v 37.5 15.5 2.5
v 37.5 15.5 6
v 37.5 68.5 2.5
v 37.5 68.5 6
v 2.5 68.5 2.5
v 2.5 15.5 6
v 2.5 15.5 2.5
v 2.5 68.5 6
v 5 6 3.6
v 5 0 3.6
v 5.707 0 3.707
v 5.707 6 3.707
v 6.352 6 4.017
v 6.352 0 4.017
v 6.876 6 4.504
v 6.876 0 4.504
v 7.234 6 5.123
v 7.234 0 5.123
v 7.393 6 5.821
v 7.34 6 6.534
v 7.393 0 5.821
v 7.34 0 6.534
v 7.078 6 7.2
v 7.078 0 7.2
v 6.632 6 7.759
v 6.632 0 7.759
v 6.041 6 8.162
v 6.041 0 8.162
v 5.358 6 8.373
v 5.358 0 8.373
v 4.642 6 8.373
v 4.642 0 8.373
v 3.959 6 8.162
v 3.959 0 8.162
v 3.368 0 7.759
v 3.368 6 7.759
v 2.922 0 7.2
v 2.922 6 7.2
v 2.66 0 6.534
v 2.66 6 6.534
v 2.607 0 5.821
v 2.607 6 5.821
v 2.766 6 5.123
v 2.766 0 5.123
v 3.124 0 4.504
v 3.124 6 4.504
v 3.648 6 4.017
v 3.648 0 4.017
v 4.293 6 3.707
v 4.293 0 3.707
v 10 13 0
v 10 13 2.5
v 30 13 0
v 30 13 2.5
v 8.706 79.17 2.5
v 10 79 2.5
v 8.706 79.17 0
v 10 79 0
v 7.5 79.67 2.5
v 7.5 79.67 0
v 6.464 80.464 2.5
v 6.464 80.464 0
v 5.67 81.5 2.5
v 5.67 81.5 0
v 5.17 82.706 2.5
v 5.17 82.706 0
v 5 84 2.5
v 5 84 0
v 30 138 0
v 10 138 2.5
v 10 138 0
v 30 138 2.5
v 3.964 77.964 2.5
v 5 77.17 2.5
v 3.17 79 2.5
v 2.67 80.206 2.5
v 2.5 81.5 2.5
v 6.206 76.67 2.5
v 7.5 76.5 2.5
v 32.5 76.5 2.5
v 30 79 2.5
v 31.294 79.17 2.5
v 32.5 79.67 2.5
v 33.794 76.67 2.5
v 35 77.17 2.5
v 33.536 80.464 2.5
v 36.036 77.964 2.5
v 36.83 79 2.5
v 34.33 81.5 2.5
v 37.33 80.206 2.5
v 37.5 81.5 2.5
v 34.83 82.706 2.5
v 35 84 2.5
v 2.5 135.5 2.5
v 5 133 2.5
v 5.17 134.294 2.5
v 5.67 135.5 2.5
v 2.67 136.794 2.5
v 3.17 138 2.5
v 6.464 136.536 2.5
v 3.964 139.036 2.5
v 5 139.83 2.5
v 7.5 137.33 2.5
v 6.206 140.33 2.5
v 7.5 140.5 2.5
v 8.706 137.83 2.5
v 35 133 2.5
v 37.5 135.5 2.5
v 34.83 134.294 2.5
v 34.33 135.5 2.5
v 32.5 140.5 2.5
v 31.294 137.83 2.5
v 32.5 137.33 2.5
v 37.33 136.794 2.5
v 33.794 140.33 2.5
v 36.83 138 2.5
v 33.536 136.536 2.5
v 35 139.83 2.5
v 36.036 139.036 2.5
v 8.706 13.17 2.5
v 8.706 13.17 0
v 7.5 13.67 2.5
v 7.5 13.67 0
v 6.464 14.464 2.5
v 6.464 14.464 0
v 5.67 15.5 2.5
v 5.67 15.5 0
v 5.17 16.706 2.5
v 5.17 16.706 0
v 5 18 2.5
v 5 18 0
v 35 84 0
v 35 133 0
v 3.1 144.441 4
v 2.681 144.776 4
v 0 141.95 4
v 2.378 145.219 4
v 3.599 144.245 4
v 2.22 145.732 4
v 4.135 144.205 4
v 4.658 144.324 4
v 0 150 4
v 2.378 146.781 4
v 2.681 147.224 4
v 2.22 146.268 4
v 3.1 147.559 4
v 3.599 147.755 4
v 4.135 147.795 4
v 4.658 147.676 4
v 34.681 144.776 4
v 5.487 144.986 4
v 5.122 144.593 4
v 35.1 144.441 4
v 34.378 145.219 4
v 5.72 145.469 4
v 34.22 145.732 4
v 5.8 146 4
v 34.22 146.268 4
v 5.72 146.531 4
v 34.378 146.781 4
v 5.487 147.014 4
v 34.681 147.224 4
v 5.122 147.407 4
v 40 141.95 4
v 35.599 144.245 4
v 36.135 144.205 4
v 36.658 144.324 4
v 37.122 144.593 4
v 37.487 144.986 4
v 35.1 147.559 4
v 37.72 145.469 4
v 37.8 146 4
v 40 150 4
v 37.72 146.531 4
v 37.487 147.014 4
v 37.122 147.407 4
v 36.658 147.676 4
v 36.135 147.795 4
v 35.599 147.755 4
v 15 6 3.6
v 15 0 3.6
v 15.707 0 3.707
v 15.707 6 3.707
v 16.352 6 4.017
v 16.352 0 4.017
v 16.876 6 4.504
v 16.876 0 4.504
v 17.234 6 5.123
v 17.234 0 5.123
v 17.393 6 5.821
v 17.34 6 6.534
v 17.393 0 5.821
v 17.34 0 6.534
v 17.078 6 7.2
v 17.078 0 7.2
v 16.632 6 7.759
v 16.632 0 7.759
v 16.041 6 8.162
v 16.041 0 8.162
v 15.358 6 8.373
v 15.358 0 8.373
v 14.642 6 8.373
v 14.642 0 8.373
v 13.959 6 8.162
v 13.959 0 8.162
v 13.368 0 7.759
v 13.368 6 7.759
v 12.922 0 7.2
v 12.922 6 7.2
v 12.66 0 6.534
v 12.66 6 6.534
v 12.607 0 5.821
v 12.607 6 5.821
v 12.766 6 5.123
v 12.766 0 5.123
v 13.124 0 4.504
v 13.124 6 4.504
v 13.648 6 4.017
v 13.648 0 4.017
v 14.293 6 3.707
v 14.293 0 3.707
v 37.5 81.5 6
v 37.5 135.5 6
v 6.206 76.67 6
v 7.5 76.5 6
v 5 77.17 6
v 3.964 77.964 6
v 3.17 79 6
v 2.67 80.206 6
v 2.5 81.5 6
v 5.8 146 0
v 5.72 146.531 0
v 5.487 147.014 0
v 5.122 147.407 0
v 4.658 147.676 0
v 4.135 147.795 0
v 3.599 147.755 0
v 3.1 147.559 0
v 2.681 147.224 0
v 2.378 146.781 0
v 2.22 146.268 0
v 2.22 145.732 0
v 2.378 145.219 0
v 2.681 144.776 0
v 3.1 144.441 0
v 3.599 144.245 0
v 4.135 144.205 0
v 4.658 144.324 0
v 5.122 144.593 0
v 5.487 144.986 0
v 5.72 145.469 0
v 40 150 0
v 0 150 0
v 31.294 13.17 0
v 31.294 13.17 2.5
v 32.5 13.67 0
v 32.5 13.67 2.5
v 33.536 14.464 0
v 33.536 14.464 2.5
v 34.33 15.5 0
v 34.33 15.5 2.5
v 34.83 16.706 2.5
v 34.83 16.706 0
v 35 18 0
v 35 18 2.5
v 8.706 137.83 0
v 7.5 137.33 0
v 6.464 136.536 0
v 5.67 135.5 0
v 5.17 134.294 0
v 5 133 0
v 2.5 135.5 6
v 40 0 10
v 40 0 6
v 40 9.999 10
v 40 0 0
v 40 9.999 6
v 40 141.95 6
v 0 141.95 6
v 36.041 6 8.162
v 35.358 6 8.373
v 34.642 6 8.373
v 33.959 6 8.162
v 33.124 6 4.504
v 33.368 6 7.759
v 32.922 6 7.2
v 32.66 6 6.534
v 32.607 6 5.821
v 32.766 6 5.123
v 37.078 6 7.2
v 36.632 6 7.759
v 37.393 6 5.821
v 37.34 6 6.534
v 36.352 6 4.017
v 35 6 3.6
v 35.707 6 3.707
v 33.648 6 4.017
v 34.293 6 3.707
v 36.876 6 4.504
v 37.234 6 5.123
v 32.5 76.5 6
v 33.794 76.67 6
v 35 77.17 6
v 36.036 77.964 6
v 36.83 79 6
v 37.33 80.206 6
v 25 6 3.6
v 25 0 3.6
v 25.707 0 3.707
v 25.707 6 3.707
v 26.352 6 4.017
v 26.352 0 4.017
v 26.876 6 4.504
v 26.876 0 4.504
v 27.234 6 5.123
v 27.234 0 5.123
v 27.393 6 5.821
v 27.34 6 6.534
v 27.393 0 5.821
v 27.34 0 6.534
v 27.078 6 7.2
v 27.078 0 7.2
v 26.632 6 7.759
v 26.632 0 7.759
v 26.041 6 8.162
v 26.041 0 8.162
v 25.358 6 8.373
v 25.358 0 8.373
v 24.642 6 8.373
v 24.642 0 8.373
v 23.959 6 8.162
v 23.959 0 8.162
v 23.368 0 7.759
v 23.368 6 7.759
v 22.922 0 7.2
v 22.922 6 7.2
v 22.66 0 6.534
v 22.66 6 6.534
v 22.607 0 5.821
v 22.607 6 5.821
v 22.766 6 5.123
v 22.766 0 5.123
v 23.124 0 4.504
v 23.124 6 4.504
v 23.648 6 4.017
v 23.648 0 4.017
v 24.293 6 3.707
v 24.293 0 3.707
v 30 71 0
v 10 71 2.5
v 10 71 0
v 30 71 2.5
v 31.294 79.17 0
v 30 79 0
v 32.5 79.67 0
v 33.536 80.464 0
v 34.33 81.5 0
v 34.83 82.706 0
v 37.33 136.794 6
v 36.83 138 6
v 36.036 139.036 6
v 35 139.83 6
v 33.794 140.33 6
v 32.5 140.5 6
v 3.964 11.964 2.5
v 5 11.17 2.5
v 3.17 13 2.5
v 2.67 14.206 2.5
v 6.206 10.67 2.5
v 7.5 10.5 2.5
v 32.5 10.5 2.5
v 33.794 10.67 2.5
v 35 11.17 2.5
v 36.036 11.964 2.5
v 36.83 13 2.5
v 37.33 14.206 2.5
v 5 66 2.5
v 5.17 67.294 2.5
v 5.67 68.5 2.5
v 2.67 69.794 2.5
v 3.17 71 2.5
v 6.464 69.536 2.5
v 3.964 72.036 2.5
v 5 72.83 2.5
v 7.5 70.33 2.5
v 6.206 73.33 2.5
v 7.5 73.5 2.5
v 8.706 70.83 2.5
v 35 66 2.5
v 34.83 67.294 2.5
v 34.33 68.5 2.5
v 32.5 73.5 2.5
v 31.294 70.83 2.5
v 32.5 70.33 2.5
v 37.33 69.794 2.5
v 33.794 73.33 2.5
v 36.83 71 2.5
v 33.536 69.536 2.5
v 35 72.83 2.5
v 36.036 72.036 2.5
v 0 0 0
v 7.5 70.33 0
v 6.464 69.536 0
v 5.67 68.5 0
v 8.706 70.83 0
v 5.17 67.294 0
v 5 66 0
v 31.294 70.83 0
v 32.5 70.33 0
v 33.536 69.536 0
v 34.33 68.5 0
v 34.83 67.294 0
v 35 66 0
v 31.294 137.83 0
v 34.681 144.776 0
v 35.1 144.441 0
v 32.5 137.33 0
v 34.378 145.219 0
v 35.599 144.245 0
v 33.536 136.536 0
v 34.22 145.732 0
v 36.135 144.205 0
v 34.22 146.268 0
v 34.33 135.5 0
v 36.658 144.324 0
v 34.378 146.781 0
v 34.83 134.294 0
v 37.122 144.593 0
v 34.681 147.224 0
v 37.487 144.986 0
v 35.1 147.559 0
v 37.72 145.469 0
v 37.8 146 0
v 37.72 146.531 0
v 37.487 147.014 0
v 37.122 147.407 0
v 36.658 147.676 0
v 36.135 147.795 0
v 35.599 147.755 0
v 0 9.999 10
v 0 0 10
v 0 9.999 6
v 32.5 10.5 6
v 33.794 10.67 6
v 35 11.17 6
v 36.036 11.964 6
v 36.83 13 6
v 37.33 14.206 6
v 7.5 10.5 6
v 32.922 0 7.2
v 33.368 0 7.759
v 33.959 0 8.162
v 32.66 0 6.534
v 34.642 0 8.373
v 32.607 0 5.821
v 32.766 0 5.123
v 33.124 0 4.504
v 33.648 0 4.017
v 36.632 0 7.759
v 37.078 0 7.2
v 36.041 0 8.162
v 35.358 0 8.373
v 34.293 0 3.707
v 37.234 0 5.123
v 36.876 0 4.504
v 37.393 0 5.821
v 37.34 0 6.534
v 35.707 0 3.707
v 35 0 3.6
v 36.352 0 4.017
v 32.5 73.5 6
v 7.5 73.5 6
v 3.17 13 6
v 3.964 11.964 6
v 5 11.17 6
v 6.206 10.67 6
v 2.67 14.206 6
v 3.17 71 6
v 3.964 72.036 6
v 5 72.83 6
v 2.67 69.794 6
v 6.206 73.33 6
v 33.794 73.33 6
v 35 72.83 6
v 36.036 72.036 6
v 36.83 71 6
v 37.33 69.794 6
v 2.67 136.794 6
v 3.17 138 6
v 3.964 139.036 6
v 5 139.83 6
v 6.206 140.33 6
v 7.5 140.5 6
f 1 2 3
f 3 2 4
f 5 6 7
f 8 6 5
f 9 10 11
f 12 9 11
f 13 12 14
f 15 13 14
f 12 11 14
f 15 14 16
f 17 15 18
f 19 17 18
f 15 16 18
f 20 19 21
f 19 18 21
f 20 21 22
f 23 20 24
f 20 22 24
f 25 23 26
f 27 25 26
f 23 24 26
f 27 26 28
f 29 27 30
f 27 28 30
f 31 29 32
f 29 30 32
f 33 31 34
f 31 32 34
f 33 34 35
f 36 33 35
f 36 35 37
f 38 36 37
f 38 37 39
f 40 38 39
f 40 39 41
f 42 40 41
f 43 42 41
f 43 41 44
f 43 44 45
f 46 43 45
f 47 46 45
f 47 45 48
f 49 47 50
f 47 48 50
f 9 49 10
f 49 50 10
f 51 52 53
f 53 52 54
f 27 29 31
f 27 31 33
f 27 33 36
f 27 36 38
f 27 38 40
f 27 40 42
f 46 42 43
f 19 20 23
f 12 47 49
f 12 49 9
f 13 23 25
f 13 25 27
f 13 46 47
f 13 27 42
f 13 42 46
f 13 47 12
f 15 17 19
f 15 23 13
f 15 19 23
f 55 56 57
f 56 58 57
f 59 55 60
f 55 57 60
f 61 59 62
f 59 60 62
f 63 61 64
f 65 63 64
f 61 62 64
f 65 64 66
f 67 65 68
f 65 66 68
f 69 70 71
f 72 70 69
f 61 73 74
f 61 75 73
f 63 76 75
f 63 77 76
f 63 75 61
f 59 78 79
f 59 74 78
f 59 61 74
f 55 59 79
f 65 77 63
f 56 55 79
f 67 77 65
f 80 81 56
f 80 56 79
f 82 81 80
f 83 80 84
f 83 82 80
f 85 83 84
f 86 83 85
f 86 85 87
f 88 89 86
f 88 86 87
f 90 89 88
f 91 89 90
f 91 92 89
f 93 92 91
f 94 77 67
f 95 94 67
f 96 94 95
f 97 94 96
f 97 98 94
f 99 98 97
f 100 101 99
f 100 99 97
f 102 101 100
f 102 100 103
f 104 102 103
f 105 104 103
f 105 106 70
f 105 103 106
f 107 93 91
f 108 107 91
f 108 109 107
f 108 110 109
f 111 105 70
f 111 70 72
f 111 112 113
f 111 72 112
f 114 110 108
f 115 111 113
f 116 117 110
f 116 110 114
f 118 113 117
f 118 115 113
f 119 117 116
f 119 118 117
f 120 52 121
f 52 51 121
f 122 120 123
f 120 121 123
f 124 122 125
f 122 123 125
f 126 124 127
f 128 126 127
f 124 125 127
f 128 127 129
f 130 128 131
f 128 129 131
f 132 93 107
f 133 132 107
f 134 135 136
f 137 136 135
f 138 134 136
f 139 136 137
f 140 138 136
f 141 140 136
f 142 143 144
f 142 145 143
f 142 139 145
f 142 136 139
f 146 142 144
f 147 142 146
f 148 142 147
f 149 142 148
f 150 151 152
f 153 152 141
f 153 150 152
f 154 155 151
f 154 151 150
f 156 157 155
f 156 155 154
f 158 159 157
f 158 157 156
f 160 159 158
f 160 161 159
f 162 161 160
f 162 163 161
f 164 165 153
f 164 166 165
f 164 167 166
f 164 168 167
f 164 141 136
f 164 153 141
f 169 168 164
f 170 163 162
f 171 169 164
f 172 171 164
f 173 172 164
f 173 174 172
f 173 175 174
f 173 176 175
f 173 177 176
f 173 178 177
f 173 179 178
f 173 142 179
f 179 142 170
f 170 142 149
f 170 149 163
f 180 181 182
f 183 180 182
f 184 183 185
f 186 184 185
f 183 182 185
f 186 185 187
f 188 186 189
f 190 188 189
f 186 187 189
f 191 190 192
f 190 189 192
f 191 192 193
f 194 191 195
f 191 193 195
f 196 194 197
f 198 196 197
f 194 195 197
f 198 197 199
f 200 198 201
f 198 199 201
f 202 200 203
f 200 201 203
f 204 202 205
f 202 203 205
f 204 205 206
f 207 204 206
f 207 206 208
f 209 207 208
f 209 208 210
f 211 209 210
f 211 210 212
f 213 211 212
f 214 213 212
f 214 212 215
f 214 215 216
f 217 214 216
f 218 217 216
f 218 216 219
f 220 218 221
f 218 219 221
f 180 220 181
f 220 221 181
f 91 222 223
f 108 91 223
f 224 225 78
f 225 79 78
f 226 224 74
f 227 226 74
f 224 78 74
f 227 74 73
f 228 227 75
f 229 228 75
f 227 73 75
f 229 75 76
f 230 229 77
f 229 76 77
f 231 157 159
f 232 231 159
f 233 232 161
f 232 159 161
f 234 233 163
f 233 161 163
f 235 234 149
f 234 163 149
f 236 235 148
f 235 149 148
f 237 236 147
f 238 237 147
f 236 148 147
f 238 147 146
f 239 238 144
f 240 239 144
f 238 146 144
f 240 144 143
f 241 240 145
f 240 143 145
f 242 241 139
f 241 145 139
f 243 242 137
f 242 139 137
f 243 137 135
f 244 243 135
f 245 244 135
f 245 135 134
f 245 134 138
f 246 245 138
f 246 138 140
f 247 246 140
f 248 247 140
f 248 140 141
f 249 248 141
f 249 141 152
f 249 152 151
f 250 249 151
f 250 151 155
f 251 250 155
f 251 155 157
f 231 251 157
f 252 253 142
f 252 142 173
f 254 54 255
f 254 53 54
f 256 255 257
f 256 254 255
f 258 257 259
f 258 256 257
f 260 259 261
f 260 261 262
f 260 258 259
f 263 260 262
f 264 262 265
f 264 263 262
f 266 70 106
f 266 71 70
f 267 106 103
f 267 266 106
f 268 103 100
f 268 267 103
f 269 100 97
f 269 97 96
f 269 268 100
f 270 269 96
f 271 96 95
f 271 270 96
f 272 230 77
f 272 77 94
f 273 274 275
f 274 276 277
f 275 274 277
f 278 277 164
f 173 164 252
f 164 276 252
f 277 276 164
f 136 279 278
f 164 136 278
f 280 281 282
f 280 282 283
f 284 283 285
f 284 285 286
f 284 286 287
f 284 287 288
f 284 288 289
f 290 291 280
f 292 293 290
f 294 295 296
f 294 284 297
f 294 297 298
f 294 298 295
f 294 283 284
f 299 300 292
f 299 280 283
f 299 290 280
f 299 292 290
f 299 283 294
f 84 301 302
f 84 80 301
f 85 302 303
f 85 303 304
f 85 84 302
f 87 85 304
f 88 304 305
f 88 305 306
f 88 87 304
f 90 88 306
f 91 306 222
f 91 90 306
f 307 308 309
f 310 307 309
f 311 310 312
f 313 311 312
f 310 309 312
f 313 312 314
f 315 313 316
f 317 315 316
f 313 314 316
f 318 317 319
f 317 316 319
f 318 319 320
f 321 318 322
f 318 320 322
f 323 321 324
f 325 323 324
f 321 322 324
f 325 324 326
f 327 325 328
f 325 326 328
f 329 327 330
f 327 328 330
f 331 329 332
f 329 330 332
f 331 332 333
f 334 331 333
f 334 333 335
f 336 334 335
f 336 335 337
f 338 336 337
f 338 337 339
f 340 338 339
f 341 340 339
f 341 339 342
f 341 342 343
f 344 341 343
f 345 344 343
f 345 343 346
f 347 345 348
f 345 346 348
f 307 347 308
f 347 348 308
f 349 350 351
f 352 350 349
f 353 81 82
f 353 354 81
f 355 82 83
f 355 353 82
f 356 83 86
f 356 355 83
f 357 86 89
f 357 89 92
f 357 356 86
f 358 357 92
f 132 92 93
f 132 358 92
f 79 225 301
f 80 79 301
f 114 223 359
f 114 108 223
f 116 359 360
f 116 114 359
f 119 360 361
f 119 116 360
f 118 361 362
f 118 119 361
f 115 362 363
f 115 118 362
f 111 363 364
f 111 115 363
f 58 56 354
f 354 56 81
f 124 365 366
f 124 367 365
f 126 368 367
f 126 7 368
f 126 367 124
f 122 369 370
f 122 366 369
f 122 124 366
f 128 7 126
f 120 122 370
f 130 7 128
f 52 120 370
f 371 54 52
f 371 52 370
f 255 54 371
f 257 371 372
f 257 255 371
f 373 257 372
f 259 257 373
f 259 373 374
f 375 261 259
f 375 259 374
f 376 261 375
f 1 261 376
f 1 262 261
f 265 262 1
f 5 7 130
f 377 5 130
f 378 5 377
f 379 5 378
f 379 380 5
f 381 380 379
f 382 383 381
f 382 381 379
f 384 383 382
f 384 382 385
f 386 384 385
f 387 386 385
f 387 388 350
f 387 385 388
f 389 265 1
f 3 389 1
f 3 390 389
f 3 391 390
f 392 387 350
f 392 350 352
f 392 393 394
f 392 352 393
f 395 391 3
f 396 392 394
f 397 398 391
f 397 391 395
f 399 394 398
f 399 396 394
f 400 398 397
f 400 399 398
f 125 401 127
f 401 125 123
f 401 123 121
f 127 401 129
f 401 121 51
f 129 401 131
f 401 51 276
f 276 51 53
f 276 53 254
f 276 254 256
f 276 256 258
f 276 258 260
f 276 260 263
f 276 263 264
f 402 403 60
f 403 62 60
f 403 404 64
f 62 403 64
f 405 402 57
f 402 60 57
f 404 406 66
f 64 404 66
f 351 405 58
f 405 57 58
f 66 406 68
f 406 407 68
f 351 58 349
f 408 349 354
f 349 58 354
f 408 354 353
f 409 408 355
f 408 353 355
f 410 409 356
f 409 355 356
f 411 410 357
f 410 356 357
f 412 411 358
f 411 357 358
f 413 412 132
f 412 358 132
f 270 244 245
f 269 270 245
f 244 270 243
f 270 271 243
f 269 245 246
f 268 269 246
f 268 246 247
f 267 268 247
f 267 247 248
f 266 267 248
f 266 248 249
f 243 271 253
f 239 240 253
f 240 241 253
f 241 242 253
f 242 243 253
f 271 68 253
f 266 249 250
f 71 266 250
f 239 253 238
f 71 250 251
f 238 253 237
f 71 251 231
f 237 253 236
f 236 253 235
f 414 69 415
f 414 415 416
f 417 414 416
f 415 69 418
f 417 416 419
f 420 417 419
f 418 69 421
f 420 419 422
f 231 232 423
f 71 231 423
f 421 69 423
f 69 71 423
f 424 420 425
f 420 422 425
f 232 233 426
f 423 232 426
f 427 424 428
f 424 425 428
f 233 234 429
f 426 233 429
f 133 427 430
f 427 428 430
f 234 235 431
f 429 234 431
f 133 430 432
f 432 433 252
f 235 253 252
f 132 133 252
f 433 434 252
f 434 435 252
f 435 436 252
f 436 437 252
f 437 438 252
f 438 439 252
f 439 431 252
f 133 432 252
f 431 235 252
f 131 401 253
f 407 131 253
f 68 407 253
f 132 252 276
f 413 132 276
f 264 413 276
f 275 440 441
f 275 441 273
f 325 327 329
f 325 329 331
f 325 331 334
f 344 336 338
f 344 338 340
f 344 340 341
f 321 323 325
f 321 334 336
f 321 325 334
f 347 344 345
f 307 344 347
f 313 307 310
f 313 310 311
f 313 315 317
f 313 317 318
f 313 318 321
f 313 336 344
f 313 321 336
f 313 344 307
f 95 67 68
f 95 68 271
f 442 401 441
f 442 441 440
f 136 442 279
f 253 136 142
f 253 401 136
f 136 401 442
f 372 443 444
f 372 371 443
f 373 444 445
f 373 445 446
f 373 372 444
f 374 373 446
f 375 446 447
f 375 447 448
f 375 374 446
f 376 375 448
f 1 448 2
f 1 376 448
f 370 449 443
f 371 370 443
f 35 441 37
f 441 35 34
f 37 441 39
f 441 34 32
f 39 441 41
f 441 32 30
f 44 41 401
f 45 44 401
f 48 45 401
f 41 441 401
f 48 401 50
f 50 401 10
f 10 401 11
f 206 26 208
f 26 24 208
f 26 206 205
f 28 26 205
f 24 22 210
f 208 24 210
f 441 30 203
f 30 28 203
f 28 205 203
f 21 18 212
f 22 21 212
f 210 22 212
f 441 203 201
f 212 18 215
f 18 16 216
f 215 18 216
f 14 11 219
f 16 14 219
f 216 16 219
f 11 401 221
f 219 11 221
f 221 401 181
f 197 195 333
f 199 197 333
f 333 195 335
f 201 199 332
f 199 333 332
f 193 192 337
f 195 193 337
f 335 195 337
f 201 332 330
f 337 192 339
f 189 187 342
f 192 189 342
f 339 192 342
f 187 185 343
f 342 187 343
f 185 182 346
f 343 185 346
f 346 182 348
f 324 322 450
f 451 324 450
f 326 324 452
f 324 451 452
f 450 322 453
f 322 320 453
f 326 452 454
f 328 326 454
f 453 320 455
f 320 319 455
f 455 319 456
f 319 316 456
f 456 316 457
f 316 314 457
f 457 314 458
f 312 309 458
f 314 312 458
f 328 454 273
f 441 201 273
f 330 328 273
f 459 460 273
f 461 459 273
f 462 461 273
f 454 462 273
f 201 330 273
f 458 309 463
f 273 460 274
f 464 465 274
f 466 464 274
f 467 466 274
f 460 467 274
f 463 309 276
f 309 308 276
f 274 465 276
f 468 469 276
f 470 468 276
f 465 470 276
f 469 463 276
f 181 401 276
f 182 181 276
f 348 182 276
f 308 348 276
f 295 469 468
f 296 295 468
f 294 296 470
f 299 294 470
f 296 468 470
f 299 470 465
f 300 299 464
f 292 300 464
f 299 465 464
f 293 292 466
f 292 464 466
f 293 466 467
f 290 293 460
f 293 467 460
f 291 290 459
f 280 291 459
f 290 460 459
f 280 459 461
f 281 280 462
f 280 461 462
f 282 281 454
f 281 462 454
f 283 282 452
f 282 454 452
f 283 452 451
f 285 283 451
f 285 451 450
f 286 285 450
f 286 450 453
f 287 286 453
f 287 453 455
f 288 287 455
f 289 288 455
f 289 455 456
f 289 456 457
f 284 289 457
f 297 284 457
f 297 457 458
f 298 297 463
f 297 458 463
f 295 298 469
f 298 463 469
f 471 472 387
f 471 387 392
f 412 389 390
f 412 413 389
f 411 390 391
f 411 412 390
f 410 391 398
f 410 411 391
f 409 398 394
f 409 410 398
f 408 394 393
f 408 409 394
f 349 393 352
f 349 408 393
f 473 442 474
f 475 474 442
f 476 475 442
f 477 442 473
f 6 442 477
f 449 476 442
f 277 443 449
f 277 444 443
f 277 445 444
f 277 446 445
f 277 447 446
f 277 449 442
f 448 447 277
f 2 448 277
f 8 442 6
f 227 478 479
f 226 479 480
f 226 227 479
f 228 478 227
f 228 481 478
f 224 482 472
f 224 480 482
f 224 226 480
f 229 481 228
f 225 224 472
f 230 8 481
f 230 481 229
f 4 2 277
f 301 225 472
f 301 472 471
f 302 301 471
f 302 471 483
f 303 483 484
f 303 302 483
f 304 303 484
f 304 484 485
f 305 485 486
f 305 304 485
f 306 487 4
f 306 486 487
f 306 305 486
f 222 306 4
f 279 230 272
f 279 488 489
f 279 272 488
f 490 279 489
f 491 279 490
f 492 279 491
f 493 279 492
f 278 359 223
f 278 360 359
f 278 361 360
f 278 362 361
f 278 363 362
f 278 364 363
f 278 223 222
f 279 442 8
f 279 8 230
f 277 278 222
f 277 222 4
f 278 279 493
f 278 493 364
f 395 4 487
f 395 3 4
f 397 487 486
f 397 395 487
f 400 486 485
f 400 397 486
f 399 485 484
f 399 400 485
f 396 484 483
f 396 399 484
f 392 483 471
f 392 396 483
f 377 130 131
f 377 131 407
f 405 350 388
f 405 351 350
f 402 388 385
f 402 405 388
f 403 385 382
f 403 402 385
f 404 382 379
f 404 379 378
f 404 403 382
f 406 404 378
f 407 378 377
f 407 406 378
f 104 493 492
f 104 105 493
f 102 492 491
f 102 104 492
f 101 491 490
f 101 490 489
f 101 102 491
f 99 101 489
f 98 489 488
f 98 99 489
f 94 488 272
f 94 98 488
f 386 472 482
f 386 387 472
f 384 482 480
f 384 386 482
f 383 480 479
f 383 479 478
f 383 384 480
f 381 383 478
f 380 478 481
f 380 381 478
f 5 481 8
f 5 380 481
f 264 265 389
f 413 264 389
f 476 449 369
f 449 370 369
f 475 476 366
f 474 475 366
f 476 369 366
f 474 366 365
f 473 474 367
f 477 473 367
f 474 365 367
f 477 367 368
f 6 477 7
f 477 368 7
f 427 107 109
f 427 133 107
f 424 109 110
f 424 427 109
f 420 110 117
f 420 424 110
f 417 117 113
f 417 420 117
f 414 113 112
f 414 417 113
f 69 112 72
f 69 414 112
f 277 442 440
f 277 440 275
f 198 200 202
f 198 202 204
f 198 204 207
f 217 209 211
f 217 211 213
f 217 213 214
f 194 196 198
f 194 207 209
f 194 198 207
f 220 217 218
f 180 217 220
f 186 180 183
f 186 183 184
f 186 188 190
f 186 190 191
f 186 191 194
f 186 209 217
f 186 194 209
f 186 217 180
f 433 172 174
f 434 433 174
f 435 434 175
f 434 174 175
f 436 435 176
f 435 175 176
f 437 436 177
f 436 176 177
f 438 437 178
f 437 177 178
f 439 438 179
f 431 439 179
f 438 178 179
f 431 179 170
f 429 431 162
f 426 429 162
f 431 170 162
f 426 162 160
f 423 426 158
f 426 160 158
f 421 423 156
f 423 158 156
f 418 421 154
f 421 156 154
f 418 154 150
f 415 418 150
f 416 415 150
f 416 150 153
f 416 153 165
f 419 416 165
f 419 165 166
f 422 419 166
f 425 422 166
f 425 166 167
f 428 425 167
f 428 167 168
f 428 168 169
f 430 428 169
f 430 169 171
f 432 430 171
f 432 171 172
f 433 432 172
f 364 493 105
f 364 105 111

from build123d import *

# Parameters (mm, degrees)
SKETCH_1_W          = 40
SKETCH_1_H          = 150
EXTRUDE_1_DEPTH     = 6
SKETCH_3_W          = 30
SKETCH_3_H          = 59
SKETCH_3_H_2        = 58
CUT_EXTRUDE_2_DEPTH = 156.357651888
SKETCH_4_W          = 35
SKETCH_4_H          = 64
SKETCH_4_H_2        = 63
CUT_EXTRUDE_3_DEPTH = 3.5
FILLET_2_R          = 5
SKETCH_7_W          = 40
SKETCH_7_H          = 9.998672315
EXTRUDE_2_DEPTH     = 4
SKETCH_5_W          = 40
SKETCH_5_H          = 8.05
CUT_EXTRUDE_4_DEPTH = 2
SKETCH_8_R          = 2.4
CUT_EXTRUDE_5_DEPTH = 6
SKETCH_9_R          = 1.8
CUT_EXTRUDE_6_DEPTH = 156.357651888


with BuildPart() as part:
    # ｽｹｯﾁ1 → ﾎﾞｽ - 押し出し1 (new body)
    with BuildSketch(Plane.XY):
        with Locations((20, 75)):
            Rectangle(SKETCH_1_W, SKETCH_1_H)
    extrude(amount=EXTRUDE_1_DEPTH)

    # ｽｹｯﾁ3 → ｶｯﾄ - 押し出し2 (cut, through all)
    with BuildSketch(Plane.XY.offset(6)):
        with Locations((20, 108.5)):
            Rectangle(SKETCH_3_W, SKETCH_3_H)
        with Locations((20, 42)):
            Rectangle(SKETCH_3_W, SKETCH_3_H_2)
    extrude(amount=-CUT_EXTRUDE_2_DEPTH, mode=Mode.SUBTRACT)

    # ｽｹｯﾁ4 → ｶｯﾄ - 押し出し3 (cut)
    with BuildSketch(Plane.XY.offset(6)):
        with Locations((20, 108.5)):
            Rectangle(SKETCH_4_W, SKETCH_4_H)
        with Locations((20, 42)):
            Rectangle(SKETCH_4_W, SKETCH_4_H_2)
    extrude(amount=-CUT_EXTRUDE_3_DEPTH, mode=Mode.SUBTRACT)

    # ﾌｨﾚｯﾄ2
    fillet_2_edges = [part.edges().sort_by_distance(p)[0] for p in [
        (35, 138, 1.25),
        (35, 79, 1.25),
        (5, 79, 1.25),
        (5, 138, 1.25),
        (35, 71, 1.25),
        (35, 13, 1.25),
        (5, 13, 1.25),
        (5, 71, 1.25),
        (2.5, 76.5, 4.25),
        (2.5, 140.5, 4.25),
        (37.5, 140.5, 4.25),
        (37.5, 76.5, 4.25),
        (2.5, 10.5, 4.25),
        (2.5, 73.5, 4.25),
        (37.5, 73.5, 4.25),
        (37.5, 10.5, 4.25),
    ]]
    fillet(fillet_2_edges, radius=FILLET_2_R)

    # ｽｹｯﾁ7 → ﾎﾞｽ - 押し出し2 (add)
    with BuildSketch(Plane.XY.offset(6)):
        with Locations((20, 4.999336158)):
            Rectangle(SKETCH_7_W, SKETCH_7_H)
    extrude(amount=EXTRUDE_2_DEPTH)

    # ｽｹｯﾁ5 → ｶｯﾄ - 押し出し4 (cut)
    with BuildSketch(Plane.XY.offset(6)):
        with Locations((20, 145.975)):
            Rectangle(SKETCH_5_W, SKETCH_5_H)
    extrude(amount=-CUT_EXTRUDE_4_DEPTH, mode=Mode.SUBTRACT)

    # ｽｹｯﾁ8 → ｶｯﾄ - 押し出し5 (cut)
    with BuildSketch(Plane.XZ):
        with Locations(Location((5, 6, 0), (0, 0, 270))):
            Circle(SKETCH_8_R)
        with Locations(Location((25, 6, 0), (0, 0, 270))):
            Circle(SKETCH_8_R)
        with Locations(Location((35, 6, 0), (0, 0, 270))):
            Circle(SKETCH_8_R)
        with Locations(Location((15, 6, 0), (0, 0, 270))):
            Circle(SKETCH_8_R)
    extrude(amount=-CUT_EXTRUDE_5_DEPTH, mode=Mode.SUBTRACT)

    # ｽｹｯﾁ9 → ｶｯﾄ - 押し出し6 (cut, through all)
    with BuildSketch(Plane.XY.offset(4)):
        with Locations((4, 146)):
            Circle(SKETCH_9_R)
        with Locations((36, 146)):
            Circle(SKETCH_9_R)
    extrude(amount=-CUT_EXTRUDE_6_DEPTH, mode=Mode.SUBTRACT)


solid = part.part
